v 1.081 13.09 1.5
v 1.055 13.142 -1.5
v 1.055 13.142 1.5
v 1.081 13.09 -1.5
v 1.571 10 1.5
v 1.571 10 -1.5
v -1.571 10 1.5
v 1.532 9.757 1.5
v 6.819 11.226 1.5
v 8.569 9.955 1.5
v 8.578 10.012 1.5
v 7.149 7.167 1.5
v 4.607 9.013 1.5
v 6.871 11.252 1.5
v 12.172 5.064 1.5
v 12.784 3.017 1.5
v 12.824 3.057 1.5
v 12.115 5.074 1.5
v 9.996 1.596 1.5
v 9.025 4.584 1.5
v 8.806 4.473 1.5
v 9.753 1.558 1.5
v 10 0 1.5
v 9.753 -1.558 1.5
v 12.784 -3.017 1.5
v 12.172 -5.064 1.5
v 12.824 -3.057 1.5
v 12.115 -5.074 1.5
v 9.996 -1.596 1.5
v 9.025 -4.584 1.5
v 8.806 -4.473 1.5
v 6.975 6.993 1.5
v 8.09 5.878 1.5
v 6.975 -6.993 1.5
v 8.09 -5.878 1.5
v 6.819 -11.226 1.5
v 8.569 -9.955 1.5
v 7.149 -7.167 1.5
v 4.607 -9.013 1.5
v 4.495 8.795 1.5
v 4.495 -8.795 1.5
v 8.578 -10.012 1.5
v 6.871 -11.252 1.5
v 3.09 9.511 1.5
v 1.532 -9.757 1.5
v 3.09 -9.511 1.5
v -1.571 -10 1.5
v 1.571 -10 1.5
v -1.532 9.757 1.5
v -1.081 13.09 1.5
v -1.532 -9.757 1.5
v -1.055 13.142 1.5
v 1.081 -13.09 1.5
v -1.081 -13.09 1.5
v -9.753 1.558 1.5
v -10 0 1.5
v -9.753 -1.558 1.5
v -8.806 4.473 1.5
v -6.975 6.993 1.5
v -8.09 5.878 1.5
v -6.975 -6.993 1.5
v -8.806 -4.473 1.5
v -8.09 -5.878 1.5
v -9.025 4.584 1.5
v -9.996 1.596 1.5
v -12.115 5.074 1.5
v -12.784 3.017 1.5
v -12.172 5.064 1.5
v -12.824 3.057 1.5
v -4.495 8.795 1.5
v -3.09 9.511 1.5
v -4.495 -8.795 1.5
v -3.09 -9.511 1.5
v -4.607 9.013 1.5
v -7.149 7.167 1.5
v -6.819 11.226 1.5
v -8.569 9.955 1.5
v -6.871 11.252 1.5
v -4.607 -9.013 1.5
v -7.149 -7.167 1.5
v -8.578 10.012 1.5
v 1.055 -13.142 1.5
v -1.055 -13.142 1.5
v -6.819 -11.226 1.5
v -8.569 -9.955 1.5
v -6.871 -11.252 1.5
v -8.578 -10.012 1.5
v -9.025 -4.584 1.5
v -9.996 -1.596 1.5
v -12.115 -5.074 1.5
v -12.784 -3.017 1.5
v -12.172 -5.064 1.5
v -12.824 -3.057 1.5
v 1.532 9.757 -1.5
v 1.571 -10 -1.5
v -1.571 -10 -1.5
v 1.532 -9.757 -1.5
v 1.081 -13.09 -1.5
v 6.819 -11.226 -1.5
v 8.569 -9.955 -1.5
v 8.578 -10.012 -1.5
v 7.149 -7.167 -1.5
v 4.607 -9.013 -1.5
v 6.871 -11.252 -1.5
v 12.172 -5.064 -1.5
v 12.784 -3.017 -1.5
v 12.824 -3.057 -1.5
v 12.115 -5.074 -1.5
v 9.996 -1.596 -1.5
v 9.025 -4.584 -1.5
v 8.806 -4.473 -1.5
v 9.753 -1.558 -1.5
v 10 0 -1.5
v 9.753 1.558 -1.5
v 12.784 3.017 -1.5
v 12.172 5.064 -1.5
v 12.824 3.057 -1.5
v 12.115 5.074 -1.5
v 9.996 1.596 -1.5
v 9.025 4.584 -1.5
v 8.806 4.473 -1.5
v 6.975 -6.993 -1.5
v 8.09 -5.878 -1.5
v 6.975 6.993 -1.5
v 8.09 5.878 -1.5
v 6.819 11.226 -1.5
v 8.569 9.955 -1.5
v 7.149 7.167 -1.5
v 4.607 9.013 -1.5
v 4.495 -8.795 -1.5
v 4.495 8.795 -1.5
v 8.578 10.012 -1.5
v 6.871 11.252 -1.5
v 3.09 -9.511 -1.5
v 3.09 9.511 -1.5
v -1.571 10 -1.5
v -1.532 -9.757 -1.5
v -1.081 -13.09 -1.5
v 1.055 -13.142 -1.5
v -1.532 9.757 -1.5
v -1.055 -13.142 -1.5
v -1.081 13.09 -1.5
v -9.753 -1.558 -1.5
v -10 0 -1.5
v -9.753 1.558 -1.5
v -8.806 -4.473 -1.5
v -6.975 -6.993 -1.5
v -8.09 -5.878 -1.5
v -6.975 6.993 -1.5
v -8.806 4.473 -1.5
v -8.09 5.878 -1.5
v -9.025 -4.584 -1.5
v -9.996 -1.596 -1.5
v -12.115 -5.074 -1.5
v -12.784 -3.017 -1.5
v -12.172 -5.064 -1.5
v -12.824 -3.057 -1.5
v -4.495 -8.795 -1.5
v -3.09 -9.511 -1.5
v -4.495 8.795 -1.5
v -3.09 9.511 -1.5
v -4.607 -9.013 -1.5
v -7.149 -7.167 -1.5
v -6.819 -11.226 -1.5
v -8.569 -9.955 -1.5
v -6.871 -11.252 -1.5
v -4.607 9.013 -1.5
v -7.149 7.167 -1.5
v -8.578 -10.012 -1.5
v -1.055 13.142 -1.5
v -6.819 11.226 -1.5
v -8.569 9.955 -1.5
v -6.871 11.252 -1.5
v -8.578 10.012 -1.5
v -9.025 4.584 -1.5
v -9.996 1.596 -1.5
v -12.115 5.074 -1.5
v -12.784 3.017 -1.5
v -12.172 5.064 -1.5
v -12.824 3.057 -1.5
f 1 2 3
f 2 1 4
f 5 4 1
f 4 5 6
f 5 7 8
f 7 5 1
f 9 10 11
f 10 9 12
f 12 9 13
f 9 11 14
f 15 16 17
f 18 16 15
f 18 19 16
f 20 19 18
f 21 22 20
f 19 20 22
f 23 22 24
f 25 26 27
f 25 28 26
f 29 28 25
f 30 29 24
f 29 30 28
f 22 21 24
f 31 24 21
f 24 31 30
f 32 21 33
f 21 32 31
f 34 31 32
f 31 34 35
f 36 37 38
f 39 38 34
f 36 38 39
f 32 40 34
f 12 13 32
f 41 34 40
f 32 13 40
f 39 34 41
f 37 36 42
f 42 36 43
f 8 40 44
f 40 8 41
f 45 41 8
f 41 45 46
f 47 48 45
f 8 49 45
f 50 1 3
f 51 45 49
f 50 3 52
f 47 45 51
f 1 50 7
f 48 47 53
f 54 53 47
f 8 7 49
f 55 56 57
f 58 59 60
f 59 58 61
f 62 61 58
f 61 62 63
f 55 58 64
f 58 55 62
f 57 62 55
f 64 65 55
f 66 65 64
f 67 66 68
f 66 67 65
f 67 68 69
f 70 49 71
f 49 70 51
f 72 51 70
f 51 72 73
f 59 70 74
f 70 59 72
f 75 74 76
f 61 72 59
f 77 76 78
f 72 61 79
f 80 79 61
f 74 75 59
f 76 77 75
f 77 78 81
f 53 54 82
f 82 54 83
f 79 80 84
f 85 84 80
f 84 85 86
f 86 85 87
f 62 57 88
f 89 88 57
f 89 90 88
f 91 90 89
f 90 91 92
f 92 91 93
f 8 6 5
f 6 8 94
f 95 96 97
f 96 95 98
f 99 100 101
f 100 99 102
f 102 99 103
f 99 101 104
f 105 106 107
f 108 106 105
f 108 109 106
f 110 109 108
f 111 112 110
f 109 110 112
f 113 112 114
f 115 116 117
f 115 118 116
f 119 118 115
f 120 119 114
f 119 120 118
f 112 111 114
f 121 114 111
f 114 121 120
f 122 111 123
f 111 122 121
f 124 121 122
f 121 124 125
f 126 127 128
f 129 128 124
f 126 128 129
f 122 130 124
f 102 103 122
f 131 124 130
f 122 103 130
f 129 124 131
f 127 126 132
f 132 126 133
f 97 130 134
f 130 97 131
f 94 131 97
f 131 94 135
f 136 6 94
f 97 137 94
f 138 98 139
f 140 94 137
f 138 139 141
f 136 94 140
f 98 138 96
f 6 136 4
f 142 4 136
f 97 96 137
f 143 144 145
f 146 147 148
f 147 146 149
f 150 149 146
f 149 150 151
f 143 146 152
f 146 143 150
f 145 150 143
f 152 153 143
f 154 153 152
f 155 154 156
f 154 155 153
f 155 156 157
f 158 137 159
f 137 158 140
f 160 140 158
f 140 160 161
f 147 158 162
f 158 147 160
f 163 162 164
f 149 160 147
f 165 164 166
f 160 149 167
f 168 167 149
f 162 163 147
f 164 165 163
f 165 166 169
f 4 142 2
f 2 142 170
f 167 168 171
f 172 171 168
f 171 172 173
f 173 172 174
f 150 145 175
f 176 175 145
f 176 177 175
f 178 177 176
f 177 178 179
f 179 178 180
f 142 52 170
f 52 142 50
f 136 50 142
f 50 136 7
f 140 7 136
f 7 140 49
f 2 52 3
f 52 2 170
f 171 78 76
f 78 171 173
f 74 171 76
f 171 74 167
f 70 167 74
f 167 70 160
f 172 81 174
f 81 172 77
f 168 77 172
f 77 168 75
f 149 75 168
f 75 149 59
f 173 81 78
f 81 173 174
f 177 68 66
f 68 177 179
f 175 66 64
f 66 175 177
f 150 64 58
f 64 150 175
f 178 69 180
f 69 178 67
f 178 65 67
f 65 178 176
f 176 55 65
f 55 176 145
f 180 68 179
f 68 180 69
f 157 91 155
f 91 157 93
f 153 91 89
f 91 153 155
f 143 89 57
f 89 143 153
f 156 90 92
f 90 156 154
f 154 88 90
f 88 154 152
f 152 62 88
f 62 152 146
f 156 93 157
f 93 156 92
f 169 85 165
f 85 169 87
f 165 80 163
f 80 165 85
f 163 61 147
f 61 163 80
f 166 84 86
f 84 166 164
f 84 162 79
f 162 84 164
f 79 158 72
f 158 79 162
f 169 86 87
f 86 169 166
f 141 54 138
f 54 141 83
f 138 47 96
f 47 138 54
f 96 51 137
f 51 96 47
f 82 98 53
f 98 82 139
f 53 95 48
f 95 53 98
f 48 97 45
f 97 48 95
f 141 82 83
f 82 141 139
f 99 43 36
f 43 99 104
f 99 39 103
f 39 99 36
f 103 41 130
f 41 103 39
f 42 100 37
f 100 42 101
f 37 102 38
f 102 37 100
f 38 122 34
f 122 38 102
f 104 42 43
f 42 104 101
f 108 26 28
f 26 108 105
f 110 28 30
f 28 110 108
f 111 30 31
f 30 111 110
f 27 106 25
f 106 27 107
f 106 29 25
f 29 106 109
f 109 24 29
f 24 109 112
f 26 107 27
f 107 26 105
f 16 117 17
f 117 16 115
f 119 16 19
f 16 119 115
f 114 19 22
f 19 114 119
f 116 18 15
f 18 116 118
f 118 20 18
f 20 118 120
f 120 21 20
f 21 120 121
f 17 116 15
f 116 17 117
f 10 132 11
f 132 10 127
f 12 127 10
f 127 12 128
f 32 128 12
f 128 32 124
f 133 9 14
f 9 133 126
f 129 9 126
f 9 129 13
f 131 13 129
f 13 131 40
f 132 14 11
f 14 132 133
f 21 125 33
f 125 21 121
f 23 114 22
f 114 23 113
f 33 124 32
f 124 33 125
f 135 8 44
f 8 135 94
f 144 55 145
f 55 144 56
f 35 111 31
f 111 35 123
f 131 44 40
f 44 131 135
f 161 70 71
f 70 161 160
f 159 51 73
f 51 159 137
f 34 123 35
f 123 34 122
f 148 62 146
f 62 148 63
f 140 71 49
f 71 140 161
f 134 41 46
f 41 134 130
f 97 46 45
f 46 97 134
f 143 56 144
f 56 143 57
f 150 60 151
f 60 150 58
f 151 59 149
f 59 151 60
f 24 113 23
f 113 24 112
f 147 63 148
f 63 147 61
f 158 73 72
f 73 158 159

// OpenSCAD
// Helical Gears
// Catarina Mota
// catarinamfmota@gmail.com
// 20091123


//GEAR PARAMETERS
doubleHelical=1; //int: 0=no, 1=yes (will make the gear 2x taller)

gearHeight=5; //gear depth

pitchDiam=45; //pitch diameter

shaftDiam=5; //shaft diameter

//TEETH PARAMETERS
teethNum=10; //number of teeth (int)

addendum=2;
$fn = 20;

gearRadius = 10;
gearThickness = 3;
toothCount = 10;

spurGearApproximation(gearRadius, gearThickness, toothCount);

module spurGearApproximation(gearRadius, gearThickness, toothCount){
    echo("Usage: spurGearApproximation(gearRadius, gearThickness, toothCount);");
    echo("Example: spurGearApproximation(10,3,20);");
    circumference = 2*3.14159*gearRadius;
    toothWidth = circumference  / 2 / toothCount;
    toothLength = 2*toothWidth;
    for(i = [0:360/toothCount:360-(360/toothCount)]){
        spurTooth(toothWidth, toothLength, gearThickness, gearRadius, i);
    }
    cylinder(gearThickness, gearRadius, gearRadius, center = true);
}

module spurTooth(toothWidth, toothLength, toothDepth, gearRadius, rotation){
    rotate([0,0,rotation]){
        translate([0,gearRadius,0]){
            intersection(){
                translate([-(gearRadius-toothWidth/2), 0, 0]){
                    cylinder(toothDepth, gearRadius, gearRadius, center = true);
                }
                translate([(gearRadius-toothWidth/2), 0, 0]){
                    cylinder(toothDepth, gearRadius, gearRadius, center = true);
                }
                translate([0, 0, 0]){
                    cube([toothWidth, toothLength/1, toothDepth], center = true);
                }
            }
        }
    }
}
